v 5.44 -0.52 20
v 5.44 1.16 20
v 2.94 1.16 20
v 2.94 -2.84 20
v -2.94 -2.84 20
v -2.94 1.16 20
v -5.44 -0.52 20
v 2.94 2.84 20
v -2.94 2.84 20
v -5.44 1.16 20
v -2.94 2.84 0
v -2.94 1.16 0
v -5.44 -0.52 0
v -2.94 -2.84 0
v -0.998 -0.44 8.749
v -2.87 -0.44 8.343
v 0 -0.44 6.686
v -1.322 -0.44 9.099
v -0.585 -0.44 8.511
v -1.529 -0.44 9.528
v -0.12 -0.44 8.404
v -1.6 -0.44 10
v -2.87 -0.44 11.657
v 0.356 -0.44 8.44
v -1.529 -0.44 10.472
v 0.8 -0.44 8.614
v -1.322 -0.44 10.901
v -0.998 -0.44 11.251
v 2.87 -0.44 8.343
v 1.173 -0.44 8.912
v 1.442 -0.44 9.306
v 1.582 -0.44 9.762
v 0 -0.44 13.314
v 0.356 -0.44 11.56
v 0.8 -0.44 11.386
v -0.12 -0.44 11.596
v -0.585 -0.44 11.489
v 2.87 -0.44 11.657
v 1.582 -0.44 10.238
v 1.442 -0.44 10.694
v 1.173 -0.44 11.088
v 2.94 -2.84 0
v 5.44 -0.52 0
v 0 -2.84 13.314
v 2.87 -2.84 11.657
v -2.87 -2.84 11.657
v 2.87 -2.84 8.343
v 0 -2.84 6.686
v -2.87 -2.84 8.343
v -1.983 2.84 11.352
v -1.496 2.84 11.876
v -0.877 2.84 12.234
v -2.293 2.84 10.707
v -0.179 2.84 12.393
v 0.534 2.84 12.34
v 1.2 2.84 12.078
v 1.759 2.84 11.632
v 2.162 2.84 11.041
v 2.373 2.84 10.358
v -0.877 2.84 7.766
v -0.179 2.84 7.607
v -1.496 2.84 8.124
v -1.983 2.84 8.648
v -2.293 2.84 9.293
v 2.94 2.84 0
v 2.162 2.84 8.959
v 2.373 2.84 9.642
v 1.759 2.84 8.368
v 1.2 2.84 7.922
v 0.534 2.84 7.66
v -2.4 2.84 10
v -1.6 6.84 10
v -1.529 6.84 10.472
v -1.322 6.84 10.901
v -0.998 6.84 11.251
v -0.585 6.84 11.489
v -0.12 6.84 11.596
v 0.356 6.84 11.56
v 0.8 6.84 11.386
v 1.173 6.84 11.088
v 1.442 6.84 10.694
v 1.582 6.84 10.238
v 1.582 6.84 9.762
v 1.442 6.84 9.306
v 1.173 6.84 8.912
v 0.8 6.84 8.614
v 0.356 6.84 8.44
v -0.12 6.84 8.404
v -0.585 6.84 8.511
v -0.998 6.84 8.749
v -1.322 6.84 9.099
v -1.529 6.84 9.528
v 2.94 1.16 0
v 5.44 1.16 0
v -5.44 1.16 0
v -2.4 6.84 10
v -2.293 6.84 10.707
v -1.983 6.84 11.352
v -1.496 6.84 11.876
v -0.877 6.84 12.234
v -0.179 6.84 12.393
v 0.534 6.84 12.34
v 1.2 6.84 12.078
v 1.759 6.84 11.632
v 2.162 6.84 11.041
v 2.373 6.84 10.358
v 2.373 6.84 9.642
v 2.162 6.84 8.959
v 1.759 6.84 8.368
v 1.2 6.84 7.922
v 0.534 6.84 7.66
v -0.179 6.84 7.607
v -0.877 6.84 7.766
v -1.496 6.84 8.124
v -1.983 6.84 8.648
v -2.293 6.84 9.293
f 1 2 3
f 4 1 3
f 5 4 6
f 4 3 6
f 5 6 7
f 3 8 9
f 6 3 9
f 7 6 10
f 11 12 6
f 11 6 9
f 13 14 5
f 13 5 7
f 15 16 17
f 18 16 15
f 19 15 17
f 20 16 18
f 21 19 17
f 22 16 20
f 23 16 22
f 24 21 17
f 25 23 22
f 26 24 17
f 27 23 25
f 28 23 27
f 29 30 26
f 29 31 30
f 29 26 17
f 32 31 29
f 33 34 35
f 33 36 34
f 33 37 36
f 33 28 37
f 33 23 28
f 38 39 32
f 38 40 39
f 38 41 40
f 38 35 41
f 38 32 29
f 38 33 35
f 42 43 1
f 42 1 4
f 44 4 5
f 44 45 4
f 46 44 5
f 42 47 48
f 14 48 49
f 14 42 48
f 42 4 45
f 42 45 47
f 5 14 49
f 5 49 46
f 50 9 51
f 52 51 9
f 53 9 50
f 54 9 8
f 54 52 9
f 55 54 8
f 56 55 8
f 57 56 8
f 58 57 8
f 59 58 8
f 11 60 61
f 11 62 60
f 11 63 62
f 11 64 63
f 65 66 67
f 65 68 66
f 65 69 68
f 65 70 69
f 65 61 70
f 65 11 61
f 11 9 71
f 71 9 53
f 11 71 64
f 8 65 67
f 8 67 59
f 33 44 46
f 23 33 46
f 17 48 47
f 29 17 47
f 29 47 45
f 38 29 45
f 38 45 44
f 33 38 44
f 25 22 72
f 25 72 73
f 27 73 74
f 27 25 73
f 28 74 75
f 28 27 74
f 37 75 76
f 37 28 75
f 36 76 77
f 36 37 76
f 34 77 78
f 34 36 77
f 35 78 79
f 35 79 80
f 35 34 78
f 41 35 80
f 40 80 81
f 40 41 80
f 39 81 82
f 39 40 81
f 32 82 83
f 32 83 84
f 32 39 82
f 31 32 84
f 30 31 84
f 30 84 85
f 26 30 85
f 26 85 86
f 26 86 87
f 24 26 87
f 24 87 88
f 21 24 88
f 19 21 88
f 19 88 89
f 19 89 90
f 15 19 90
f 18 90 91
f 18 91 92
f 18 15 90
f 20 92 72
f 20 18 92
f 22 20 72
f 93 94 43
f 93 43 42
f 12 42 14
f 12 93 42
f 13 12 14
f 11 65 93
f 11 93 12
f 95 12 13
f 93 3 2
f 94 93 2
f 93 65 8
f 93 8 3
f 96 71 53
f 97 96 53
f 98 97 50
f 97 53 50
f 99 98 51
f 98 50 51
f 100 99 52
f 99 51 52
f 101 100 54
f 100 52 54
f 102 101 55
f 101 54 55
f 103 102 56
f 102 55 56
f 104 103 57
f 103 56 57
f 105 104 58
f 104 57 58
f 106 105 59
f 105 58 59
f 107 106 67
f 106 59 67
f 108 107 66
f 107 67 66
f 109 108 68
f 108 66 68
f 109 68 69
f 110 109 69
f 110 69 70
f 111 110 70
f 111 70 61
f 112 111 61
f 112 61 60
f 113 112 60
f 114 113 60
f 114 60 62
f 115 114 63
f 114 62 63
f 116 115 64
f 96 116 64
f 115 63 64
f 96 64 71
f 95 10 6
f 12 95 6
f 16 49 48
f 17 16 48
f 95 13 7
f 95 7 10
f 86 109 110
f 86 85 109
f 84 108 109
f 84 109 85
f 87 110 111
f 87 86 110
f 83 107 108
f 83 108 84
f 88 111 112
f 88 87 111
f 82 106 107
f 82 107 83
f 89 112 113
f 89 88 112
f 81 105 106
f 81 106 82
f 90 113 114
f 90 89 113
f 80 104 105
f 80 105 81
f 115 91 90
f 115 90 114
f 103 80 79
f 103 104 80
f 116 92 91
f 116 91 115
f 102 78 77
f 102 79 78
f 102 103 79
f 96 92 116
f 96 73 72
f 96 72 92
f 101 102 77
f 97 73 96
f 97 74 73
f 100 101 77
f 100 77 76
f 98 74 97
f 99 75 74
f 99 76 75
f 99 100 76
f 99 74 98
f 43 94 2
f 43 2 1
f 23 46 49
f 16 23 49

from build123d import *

# Parameters (mm, degrees)
PAD_DEPTH       = 20
SKETCH001_R     = 1.6
POCKET_DEPTH    = 5.68
SKETCH002_R     = 2.4
SKETCH002_R_2   = 1.6
PAD001_DEPTH    = 4
SKETCH003_R     = 1.6
POCKET001_DEPTH = 2.4


with BuildPart() as part:
    # Sketch → Pad (new body)
    with BuildSketch(Plane.XY):
        Polygon((2.94, -2.84), (-2.94, -2.84), (-5.44, -0.52), (-5.44, 1.16), (-2.94, 1.16), (-2.94, 2.84), (2.94, 2.84), (2.94, 1.16), (5.44, 1.16), (5.44, -0.52), align=None)
    extrude(amount=PAD_DEPTH)

    # Sketch001 (on Face6 of Pad) → Pocket (cut)
    with BuildSketch(Plane(origin=(0, 2.84, 0), x_dir=(-1, 0, 0), z_dir=(0, 1, 0))):
        with Locations((0, 10)):
            Circle(SKETCH001_R)
    extrude(amount=-POCKET_DEPTH, mode=Mode.SUBTRACT)

    # Sketch002 (on Face11 of Pocket) → Pad001 (join)
    with BuildSketch(Plane(origin=(0, 2.84, 0), x_dir=(-1, 0, 0), z_dir=(0, 1, 0))):
        with Locations((0, 10)):
            Circle(SKETCH002_R)
        with Locations((0, 10)):
            Circle(SKETCH002_R_2, mode=Mode.SUBTRACT)
    extrude(amount=PAD001_DEPTH)

    # Sketch003 (on Face1 of Pad001) → Pocket001 (cut)
    with BuildSketch(Plane.XZ.offset(2.84)):
        Polygon((0, 6.686009), (2.87, 8.343005), (2.87, 11.656995), (0, 13.313991), (-2.87, 11.656995), (-2.87, 8.343005), align=None)
        with Locations((0, 10)):
            Circle(SKETCH003_R, mode=Mode.SUBTRACT)
    extrude(amount=-POCKET001_DEPTH, mode=Mode.SUBTRACT)


solid = part.part
